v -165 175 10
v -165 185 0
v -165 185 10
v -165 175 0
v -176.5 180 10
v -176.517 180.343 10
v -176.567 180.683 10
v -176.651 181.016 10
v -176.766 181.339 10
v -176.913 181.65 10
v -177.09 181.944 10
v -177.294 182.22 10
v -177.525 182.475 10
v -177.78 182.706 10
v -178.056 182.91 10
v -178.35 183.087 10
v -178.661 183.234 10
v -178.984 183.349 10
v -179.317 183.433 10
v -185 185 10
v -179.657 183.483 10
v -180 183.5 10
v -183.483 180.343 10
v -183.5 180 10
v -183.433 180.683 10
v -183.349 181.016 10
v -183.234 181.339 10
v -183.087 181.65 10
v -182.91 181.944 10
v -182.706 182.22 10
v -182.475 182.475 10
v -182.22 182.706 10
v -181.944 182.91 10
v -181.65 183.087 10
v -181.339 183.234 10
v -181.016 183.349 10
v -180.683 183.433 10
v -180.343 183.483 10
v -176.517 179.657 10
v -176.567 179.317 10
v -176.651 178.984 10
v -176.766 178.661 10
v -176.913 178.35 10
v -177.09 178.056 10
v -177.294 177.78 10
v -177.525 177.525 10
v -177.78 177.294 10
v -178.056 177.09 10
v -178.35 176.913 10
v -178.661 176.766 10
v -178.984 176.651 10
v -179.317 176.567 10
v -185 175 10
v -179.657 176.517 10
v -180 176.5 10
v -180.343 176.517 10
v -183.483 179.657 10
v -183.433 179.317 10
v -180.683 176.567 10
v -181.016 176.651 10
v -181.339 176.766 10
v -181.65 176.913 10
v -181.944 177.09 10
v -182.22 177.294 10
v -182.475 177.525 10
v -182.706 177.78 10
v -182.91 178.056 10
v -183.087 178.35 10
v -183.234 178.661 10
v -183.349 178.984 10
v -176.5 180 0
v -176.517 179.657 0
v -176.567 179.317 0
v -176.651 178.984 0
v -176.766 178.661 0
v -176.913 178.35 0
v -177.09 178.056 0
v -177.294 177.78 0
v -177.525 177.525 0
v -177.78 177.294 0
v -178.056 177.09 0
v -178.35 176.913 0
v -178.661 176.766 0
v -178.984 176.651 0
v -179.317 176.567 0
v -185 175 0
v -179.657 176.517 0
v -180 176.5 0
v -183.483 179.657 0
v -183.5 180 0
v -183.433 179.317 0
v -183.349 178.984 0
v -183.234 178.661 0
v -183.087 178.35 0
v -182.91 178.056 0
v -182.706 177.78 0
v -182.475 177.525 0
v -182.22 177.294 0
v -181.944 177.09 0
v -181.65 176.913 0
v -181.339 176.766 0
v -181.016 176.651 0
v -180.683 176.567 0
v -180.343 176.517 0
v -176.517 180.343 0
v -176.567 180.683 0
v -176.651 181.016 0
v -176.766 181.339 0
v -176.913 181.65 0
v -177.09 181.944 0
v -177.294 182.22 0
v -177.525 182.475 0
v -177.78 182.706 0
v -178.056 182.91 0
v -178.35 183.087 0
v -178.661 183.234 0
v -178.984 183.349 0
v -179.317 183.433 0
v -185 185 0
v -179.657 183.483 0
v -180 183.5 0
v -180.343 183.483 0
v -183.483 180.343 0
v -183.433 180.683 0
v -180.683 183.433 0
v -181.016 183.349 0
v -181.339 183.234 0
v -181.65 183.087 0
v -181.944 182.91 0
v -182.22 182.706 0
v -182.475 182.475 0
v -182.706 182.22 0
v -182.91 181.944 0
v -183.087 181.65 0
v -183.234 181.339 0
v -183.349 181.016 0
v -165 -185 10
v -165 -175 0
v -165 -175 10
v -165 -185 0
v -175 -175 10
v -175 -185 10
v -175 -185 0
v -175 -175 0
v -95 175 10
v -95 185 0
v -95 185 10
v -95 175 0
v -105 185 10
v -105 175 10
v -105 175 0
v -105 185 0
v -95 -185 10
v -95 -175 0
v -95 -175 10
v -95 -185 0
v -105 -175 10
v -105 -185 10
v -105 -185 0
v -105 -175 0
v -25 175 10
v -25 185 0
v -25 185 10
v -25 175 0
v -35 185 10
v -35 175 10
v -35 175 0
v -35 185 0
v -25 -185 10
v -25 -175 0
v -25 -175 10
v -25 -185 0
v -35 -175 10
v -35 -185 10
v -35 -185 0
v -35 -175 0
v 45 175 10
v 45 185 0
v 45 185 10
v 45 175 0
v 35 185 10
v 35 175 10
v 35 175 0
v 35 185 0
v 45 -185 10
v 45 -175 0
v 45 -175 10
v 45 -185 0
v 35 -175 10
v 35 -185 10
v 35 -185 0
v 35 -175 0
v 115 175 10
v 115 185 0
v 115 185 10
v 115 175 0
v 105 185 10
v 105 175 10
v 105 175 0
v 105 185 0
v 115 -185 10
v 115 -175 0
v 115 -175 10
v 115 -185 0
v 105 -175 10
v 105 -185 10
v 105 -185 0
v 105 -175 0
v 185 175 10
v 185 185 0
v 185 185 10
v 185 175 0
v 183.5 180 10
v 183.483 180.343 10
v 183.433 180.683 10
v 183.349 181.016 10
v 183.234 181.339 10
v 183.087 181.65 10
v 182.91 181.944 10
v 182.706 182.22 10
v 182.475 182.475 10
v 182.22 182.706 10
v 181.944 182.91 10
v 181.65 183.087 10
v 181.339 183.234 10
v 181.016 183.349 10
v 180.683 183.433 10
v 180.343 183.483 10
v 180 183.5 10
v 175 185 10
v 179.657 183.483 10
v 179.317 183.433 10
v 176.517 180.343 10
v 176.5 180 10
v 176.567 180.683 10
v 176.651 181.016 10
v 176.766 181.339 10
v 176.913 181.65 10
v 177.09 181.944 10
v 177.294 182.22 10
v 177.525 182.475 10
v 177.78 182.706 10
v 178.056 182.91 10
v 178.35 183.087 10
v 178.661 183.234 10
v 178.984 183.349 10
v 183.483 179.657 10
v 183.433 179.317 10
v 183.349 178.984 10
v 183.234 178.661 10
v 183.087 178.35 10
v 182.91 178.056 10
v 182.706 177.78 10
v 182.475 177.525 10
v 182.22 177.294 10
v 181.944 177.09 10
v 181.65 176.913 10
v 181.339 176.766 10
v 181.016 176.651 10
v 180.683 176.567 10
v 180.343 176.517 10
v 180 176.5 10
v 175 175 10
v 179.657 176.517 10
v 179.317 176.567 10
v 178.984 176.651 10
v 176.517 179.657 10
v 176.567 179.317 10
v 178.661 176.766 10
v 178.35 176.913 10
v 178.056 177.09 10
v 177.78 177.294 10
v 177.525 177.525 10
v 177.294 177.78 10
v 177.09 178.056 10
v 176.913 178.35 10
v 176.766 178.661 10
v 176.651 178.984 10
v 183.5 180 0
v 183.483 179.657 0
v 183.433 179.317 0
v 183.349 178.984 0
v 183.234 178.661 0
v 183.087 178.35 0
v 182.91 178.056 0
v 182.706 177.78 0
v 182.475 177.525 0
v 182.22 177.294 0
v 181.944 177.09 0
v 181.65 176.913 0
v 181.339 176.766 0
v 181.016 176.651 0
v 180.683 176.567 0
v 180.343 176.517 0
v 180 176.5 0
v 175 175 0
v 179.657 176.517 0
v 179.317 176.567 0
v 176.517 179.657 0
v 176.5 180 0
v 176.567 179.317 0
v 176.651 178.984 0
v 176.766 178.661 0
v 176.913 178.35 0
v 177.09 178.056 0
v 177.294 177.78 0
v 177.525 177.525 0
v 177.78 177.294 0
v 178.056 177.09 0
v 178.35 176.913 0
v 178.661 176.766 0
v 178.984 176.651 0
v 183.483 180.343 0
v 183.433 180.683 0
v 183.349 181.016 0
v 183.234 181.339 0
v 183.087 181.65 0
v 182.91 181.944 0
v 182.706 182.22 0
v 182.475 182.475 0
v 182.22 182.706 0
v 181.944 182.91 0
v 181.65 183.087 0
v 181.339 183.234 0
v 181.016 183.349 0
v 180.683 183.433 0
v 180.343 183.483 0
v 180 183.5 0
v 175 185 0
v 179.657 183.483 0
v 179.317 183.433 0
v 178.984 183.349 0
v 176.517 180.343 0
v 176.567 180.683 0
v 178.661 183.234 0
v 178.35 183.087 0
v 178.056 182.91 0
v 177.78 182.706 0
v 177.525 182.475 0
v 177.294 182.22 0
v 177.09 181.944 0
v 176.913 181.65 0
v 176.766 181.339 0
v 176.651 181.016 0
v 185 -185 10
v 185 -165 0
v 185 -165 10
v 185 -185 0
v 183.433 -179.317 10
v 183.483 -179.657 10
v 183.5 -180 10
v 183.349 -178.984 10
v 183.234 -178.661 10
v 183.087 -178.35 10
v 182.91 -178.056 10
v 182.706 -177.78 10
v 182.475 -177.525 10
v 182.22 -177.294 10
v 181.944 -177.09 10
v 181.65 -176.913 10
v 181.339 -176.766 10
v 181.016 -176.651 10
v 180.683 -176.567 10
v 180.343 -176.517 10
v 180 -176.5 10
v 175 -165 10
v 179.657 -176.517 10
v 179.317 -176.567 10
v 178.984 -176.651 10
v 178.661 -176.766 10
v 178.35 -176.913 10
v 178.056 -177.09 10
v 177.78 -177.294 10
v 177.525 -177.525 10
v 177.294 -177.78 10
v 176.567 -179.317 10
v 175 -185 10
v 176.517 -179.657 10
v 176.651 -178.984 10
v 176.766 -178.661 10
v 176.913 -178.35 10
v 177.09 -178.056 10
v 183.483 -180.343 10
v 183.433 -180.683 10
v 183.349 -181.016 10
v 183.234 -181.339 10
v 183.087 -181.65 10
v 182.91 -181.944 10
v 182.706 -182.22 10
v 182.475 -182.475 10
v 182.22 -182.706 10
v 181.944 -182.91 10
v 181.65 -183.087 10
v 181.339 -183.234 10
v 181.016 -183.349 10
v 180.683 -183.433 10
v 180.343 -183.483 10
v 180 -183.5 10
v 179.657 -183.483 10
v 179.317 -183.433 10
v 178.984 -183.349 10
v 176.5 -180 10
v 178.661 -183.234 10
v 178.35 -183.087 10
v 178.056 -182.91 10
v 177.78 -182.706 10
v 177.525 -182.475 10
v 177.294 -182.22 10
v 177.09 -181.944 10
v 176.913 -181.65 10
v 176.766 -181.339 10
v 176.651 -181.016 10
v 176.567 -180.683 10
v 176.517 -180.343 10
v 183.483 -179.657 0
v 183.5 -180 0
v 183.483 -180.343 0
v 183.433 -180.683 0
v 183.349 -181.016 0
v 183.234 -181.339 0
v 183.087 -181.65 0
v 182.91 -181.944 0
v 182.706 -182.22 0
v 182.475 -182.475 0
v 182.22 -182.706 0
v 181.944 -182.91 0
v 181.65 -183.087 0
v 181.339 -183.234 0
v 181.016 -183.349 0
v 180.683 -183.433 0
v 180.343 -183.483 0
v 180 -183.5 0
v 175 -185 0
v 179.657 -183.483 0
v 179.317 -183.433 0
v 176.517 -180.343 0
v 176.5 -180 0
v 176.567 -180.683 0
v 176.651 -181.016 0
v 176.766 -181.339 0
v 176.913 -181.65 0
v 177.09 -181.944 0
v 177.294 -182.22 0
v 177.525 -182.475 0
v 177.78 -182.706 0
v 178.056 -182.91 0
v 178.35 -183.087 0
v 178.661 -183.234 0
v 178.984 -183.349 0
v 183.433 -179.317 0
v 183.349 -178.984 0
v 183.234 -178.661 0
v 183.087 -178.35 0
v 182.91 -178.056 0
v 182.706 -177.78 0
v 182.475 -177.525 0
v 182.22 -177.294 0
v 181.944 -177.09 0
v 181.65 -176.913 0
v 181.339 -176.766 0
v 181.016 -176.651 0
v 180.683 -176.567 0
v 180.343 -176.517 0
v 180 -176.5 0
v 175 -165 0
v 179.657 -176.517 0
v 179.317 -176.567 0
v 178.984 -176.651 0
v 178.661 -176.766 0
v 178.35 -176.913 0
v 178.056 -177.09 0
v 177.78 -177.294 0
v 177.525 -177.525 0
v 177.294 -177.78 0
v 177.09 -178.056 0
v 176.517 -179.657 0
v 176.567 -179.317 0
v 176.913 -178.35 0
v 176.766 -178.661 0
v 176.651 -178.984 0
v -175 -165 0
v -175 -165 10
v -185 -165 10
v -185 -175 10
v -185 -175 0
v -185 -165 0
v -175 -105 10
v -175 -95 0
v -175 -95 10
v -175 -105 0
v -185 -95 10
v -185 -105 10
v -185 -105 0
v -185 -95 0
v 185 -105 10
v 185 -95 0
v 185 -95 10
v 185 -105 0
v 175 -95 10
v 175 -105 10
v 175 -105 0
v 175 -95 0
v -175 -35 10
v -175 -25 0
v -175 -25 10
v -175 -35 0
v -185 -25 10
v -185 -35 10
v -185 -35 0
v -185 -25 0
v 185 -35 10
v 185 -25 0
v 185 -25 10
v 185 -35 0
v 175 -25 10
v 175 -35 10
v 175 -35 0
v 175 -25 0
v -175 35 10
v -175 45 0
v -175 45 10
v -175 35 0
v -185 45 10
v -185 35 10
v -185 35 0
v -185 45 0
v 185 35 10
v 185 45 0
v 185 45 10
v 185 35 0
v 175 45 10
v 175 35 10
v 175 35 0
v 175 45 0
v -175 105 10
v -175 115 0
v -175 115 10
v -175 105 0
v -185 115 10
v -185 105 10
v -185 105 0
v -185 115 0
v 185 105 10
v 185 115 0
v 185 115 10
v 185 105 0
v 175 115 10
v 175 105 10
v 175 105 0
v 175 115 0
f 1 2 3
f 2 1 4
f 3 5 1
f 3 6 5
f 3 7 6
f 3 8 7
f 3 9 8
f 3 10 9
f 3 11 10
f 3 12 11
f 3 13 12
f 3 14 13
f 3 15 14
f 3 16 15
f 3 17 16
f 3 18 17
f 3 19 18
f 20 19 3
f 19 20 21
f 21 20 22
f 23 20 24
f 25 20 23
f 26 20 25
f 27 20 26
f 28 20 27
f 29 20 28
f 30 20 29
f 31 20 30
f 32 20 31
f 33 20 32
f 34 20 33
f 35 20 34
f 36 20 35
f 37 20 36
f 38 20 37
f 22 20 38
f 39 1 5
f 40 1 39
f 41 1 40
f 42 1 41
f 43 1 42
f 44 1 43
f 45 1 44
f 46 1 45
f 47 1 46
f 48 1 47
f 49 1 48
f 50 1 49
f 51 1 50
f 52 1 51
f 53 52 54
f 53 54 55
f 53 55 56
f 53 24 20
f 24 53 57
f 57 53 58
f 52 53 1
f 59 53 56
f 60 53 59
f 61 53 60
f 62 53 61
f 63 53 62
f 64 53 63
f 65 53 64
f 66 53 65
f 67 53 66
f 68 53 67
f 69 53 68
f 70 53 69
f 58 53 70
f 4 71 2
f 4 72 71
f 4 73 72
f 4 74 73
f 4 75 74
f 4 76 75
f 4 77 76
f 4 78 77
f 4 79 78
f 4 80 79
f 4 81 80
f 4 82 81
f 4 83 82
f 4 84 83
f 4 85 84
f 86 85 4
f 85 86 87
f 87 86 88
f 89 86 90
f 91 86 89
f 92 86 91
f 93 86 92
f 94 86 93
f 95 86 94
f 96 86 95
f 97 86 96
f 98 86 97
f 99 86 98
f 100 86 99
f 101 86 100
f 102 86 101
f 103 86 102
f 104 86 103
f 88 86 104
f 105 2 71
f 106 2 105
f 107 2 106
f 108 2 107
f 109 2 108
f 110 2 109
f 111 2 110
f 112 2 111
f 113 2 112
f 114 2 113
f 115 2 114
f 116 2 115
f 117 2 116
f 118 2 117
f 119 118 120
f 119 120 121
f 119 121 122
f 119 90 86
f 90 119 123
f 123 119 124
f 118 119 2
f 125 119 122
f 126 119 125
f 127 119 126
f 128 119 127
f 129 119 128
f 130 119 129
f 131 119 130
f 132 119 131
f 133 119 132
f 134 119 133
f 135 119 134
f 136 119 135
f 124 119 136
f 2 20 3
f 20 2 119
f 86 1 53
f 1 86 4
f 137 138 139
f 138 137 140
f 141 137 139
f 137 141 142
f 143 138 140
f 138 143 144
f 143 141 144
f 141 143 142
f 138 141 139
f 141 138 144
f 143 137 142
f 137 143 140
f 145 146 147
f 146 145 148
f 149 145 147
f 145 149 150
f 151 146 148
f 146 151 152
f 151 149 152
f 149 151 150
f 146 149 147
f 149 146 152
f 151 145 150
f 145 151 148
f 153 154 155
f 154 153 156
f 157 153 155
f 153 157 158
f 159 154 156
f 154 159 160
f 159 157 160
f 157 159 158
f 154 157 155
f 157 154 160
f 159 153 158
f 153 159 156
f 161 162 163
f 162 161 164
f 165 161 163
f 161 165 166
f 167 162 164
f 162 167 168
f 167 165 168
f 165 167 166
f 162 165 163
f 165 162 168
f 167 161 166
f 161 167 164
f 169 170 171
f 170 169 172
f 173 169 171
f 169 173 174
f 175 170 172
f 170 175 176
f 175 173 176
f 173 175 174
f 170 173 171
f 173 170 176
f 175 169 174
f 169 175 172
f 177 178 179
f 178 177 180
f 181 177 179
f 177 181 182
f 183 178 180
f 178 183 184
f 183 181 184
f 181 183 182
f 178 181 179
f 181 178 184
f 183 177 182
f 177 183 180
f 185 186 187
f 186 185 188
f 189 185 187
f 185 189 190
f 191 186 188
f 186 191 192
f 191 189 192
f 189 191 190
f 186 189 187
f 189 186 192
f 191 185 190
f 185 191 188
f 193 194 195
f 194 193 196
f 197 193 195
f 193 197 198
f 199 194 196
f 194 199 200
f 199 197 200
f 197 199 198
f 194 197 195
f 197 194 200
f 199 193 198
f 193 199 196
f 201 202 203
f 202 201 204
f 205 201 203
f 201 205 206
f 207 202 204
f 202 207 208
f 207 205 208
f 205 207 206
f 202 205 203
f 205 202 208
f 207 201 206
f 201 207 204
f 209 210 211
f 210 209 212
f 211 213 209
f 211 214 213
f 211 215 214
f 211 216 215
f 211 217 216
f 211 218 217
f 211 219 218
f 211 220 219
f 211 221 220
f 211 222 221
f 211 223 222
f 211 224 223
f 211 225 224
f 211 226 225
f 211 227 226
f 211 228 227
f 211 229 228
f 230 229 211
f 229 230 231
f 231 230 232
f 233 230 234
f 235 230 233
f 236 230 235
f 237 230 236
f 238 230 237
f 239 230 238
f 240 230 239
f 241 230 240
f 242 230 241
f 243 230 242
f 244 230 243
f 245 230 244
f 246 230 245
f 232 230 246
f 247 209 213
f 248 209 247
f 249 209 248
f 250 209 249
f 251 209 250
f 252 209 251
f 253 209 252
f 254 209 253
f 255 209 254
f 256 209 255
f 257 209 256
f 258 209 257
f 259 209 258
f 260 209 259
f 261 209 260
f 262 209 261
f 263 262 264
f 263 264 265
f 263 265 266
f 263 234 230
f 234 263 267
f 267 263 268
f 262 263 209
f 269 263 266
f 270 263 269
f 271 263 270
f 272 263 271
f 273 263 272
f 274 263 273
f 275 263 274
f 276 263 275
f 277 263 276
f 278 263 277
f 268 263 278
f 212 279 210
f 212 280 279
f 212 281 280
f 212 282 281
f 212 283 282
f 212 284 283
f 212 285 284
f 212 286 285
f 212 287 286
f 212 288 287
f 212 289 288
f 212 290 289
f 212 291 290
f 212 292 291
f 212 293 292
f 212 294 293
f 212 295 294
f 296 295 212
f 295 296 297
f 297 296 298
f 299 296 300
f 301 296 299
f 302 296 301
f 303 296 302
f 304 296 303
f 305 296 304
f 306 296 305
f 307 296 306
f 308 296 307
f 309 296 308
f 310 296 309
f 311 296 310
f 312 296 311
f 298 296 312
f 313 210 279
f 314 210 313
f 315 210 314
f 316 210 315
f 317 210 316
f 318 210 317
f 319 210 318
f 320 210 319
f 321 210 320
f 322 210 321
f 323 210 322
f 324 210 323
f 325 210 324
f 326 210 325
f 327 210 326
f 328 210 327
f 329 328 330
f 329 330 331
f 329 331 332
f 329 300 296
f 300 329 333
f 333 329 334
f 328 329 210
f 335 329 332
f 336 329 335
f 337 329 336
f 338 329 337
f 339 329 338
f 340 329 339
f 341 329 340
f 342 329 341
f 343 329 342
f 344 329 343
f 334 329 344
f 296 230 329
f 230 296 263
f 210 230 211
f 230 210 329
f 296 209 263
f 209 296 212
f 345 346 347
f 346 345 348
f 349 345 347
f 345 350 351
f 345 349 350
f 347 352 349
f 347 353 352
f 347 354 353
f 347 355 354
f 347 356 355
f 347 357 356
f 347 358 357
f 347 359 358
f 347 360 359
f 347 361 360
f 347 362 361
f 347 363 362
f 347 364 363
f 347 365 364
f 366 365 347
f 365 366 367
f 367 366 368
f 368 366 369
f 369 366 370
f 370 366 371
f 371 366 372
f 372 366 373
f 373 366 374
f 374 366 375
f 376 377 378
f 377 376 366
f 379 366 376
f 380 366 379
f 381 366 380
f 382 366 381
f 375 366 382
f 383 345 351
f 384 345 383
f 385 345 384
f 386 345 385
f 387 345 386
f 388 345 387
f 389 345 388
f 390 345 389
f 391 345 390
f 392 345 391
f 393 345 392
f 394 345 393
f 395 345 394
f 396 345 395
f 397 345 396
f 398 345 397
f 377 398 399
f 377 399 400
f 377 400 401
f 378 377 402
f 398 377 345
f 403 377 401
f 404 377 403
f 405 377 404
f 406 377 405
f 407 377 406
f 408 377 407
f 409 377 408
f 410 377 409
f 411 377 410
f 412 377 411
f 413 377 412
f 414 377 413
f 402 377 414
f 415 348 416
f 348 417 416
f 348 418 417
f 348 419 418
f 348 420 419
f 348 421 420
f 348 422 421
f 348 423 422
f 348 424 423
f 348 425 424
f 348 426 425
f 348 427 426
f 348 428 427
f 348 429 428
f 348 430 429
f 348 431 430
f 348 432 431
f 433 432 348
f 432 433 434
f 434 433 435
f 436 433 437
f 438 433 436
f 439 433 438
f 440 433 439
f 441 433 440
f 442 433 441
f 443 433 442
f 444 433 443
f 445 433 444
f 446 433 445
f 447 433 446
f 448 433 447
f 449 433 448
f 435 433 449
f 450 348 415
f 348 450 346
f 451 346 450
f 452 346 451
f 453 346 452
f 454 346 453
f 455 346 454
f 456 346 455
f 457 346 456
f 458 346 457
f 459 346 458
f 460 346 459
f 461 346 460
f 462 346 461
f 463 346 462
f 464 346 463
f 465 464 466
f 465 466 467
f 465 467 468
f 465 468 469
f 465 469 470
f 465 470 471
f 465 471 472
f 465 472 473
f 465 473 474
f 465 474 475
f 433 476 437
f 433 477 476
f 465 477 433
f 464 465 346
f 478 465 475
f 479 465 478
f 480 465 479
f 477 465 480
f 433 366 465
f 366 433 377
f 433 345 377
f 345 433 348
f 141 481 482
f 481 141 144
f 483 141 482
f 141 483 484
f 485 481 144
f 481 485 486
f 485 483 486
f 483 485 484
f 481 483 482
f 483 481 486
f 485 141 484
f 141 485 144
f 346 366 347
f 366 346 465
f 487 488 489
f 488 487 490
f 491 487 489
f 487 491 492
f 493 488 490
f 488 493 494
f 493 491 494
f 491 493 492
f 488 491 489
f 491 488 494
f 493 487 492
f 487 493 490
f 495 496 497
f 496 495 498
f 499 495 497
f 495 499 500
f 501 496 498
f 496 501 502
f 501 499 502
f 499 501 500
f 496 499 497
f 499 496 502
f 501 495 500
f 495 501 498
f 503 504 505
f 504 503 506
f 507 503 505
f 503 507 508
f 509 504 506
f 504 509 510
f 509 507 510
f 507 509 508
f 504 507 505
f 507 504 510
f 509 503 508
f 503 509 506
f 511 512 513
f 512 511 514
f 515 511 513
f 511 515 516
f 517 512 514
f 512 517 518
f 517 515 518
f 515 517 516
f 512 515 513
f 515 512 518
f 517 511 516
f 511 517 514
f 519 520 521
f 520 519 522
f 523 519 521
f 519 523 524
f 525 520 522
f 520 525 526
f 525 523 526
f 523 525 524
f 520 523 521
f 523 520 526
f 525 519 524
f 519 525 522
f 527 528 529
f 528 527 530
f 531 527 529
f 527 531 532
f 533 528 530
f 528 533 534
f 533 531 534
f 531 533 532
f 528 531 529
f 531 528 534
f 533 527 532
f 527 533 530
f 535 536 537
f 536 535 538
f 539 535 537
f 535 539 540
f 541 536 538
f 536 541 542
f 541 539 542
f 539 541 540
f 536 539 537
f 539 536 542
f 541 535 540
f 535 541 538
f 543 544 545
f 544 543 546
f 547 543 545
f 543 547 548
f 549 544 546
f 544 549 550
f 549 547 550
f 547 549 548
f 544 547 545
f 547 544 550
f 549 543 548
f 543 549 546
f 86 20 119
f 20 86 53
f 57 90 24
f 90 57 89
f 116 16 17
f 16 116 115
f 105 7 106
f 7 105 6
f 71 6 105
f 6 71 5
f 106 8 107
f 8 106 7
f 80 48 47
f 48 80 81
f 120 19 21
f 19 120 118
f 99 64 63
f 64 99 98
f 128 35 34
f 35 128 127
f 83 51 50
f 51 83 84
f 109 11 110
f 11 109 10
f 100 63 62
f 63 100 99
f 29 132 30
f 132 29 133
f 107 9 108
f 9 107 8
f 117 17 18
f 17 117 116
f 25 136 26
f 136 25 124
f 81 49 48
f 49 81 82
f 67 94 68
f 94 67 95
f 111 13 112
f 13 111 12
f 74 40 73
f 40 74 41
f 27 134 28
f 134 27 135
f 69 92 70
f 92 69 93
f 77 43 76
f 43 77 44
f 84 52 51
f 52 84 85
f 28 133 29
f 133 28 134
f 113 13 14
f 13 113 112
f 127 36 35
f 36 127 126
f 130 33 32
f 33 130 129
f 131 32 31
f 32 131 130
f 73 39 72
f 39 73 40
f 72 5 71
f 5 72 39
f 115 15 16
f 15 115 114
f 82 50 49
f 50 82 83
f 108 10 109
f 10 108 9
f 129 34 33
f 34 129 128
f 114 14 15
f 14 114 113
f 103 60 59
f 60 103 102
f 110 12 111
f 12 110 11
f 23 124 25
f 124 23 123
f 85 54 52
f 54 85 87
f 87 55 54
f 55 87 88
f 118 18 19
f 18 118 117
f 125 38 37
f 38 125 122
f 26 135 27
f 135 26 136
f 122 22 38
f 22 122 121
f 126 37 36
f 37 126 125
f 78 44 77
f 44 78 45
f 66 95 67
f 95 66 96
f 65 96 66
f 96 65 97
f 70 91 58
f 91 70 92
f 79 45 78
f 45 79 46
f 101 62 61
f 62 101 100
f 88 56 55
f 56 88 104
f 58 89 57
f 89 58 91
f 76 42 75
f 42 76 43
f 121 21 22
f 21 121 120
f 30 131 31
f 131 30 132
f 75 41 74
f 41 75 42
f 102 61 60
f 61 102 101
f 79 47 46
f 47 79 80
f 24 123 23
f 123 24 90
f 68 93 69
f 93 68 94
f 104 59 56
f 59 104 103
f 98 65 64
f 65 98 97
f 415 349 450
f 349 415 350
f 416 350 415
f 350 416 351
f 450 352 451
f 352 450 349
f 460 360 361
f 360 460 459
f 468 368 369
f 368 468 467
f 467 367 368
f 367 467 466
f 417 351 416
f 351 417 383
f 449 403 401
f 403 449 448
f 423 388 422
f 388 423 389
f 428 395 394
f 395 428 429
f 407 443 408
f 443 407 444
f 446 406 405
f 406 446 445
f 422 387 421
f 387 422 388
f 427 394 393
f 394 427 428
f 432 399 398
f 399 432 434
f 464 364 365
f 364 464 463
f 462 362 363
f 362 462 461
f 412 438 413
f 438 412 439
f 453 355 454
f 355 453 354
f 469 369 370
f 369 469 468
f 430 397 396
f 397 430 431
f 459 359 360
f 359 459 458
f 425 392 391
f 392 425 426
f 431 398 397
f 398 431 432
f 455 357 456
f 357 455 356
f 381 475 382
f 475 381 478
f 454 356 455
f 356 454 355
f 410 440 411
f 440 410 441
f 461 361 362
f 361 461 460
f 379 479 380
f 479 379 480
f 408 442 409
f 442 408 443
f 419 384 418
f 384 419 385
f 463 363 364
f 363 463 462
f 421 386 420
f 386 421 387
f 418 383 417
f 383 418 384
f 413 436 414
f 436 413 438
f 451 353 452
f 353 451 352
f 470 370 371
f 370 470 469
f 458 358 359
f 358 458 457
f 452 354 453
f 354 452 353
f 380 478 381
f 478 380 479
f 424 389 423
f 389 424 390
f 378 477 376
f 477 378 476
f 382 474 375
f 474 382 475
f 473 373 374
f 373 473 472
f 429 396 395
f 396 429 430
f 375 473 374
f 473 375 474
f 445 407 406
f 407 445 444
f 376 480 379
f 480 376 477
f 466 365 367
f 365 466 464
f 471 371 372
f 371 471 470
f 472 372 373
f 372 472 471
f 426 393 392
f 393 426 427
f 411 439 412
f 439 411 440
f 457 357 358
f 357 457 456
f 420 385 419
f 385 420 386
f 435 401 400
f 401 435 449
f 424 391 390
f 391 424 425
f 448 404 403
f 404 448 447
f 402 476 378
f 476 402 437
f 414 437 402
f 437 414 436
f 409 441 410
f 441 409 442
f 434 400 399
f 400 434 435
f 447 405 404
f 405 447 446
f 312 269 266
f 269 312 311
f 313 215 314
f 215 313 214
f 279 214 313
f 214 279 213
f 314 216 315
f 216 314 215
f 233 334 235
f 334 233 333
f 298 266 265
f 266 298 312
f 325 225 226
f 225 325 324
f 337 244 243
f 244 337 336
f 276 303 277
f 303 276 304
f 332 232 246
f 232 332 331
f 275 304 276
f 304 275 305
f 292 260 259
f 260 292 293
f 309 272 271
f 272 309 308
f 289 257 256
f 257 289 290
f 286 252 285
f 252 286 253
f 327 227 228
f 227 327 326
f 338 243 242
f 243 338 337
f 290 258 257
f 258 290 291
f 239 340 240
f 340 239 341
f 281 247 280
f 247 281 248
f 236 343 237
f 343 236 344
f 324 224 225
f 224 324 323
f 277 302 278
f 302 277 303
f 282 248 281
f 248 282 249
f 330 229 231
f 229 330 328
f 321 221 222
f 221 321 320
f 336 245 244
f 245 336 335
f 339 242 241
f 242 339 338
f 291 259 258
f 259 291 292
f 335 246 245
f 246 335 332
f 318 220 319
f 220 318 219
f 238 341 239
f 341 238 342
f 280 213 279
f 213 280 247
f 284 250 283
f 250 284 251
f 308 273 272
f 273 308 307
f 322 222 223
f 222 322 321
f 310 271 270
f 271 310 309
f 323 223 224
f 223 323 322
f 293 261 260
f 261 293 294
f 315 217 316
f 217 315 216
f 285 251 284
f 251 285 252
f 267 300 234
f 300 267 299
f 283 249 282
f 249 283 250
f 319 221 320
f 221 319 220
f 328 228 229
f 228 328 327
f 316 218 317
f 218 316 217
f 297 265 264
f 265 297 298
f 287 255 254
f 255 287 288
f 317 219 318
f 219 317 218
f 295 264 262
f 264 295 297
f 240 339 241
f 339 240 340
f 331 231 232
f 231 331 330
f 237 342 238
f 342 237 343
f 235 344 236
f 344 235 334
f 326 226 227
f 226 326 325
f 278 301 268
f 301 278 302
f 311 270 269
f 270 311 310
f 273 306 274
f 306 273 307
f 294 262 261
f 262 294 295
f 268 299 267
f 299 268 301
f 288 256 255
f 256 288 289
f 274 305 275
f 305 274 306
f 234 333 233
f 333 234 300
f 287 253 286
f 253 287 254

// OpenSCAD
// ring_56.scad - ring index 56 (z bottom = 560 mm)
$fn = 64; bar = 10; half_b = bar/2; outer = 370; half_outer = outer/2;
front_y = 180; back_y = -180; left_x = -180; right_x = 180;
x_centers = [-170, -100, -30, 40, 110, 180];
z_centers = [5, 85, 155, 225, 295, 365, 435, 505, 575, 645, 715]; ring_z = 560;
module place_box(cx, cy, sx, sy) { translate([cx - sx/2, cy - sy/2, 0]) cube([sx, sy, bar]); }

difference() { union() {
    for (x = x_centers) { place_box(x, front_y, bar, bar); place_box(x, back_y, bar, bar); }
    for (y = x_centers) { place_box(left_x, y, bar, bar); place_box(right_x, y, bar, bar); }
    for (zc = z_centers) if ((zc - half_b < ring_z + bar) && (zc + half_b > ring_z)) {
        translate([-half_outer, front_y - half_b, 0]) cube([outer, bar, bar]);
        translate([-half_outer, back_y - half_b, 0])  cube([outer, bar, bar]);
        translate([left_x - half_b, -half_outer, 0])  cube([bar, outer, bar]);
        translate([right_x - half_b, -half_outer, 0]) cube([bar, outer, bar]);
    }
  }
  for (cx = [-180, 180]) for (cy = [-180, 180]) translate([cx, cy, 0]) cylinder(h = bar, r = 3.5, $fn = 64);
}
